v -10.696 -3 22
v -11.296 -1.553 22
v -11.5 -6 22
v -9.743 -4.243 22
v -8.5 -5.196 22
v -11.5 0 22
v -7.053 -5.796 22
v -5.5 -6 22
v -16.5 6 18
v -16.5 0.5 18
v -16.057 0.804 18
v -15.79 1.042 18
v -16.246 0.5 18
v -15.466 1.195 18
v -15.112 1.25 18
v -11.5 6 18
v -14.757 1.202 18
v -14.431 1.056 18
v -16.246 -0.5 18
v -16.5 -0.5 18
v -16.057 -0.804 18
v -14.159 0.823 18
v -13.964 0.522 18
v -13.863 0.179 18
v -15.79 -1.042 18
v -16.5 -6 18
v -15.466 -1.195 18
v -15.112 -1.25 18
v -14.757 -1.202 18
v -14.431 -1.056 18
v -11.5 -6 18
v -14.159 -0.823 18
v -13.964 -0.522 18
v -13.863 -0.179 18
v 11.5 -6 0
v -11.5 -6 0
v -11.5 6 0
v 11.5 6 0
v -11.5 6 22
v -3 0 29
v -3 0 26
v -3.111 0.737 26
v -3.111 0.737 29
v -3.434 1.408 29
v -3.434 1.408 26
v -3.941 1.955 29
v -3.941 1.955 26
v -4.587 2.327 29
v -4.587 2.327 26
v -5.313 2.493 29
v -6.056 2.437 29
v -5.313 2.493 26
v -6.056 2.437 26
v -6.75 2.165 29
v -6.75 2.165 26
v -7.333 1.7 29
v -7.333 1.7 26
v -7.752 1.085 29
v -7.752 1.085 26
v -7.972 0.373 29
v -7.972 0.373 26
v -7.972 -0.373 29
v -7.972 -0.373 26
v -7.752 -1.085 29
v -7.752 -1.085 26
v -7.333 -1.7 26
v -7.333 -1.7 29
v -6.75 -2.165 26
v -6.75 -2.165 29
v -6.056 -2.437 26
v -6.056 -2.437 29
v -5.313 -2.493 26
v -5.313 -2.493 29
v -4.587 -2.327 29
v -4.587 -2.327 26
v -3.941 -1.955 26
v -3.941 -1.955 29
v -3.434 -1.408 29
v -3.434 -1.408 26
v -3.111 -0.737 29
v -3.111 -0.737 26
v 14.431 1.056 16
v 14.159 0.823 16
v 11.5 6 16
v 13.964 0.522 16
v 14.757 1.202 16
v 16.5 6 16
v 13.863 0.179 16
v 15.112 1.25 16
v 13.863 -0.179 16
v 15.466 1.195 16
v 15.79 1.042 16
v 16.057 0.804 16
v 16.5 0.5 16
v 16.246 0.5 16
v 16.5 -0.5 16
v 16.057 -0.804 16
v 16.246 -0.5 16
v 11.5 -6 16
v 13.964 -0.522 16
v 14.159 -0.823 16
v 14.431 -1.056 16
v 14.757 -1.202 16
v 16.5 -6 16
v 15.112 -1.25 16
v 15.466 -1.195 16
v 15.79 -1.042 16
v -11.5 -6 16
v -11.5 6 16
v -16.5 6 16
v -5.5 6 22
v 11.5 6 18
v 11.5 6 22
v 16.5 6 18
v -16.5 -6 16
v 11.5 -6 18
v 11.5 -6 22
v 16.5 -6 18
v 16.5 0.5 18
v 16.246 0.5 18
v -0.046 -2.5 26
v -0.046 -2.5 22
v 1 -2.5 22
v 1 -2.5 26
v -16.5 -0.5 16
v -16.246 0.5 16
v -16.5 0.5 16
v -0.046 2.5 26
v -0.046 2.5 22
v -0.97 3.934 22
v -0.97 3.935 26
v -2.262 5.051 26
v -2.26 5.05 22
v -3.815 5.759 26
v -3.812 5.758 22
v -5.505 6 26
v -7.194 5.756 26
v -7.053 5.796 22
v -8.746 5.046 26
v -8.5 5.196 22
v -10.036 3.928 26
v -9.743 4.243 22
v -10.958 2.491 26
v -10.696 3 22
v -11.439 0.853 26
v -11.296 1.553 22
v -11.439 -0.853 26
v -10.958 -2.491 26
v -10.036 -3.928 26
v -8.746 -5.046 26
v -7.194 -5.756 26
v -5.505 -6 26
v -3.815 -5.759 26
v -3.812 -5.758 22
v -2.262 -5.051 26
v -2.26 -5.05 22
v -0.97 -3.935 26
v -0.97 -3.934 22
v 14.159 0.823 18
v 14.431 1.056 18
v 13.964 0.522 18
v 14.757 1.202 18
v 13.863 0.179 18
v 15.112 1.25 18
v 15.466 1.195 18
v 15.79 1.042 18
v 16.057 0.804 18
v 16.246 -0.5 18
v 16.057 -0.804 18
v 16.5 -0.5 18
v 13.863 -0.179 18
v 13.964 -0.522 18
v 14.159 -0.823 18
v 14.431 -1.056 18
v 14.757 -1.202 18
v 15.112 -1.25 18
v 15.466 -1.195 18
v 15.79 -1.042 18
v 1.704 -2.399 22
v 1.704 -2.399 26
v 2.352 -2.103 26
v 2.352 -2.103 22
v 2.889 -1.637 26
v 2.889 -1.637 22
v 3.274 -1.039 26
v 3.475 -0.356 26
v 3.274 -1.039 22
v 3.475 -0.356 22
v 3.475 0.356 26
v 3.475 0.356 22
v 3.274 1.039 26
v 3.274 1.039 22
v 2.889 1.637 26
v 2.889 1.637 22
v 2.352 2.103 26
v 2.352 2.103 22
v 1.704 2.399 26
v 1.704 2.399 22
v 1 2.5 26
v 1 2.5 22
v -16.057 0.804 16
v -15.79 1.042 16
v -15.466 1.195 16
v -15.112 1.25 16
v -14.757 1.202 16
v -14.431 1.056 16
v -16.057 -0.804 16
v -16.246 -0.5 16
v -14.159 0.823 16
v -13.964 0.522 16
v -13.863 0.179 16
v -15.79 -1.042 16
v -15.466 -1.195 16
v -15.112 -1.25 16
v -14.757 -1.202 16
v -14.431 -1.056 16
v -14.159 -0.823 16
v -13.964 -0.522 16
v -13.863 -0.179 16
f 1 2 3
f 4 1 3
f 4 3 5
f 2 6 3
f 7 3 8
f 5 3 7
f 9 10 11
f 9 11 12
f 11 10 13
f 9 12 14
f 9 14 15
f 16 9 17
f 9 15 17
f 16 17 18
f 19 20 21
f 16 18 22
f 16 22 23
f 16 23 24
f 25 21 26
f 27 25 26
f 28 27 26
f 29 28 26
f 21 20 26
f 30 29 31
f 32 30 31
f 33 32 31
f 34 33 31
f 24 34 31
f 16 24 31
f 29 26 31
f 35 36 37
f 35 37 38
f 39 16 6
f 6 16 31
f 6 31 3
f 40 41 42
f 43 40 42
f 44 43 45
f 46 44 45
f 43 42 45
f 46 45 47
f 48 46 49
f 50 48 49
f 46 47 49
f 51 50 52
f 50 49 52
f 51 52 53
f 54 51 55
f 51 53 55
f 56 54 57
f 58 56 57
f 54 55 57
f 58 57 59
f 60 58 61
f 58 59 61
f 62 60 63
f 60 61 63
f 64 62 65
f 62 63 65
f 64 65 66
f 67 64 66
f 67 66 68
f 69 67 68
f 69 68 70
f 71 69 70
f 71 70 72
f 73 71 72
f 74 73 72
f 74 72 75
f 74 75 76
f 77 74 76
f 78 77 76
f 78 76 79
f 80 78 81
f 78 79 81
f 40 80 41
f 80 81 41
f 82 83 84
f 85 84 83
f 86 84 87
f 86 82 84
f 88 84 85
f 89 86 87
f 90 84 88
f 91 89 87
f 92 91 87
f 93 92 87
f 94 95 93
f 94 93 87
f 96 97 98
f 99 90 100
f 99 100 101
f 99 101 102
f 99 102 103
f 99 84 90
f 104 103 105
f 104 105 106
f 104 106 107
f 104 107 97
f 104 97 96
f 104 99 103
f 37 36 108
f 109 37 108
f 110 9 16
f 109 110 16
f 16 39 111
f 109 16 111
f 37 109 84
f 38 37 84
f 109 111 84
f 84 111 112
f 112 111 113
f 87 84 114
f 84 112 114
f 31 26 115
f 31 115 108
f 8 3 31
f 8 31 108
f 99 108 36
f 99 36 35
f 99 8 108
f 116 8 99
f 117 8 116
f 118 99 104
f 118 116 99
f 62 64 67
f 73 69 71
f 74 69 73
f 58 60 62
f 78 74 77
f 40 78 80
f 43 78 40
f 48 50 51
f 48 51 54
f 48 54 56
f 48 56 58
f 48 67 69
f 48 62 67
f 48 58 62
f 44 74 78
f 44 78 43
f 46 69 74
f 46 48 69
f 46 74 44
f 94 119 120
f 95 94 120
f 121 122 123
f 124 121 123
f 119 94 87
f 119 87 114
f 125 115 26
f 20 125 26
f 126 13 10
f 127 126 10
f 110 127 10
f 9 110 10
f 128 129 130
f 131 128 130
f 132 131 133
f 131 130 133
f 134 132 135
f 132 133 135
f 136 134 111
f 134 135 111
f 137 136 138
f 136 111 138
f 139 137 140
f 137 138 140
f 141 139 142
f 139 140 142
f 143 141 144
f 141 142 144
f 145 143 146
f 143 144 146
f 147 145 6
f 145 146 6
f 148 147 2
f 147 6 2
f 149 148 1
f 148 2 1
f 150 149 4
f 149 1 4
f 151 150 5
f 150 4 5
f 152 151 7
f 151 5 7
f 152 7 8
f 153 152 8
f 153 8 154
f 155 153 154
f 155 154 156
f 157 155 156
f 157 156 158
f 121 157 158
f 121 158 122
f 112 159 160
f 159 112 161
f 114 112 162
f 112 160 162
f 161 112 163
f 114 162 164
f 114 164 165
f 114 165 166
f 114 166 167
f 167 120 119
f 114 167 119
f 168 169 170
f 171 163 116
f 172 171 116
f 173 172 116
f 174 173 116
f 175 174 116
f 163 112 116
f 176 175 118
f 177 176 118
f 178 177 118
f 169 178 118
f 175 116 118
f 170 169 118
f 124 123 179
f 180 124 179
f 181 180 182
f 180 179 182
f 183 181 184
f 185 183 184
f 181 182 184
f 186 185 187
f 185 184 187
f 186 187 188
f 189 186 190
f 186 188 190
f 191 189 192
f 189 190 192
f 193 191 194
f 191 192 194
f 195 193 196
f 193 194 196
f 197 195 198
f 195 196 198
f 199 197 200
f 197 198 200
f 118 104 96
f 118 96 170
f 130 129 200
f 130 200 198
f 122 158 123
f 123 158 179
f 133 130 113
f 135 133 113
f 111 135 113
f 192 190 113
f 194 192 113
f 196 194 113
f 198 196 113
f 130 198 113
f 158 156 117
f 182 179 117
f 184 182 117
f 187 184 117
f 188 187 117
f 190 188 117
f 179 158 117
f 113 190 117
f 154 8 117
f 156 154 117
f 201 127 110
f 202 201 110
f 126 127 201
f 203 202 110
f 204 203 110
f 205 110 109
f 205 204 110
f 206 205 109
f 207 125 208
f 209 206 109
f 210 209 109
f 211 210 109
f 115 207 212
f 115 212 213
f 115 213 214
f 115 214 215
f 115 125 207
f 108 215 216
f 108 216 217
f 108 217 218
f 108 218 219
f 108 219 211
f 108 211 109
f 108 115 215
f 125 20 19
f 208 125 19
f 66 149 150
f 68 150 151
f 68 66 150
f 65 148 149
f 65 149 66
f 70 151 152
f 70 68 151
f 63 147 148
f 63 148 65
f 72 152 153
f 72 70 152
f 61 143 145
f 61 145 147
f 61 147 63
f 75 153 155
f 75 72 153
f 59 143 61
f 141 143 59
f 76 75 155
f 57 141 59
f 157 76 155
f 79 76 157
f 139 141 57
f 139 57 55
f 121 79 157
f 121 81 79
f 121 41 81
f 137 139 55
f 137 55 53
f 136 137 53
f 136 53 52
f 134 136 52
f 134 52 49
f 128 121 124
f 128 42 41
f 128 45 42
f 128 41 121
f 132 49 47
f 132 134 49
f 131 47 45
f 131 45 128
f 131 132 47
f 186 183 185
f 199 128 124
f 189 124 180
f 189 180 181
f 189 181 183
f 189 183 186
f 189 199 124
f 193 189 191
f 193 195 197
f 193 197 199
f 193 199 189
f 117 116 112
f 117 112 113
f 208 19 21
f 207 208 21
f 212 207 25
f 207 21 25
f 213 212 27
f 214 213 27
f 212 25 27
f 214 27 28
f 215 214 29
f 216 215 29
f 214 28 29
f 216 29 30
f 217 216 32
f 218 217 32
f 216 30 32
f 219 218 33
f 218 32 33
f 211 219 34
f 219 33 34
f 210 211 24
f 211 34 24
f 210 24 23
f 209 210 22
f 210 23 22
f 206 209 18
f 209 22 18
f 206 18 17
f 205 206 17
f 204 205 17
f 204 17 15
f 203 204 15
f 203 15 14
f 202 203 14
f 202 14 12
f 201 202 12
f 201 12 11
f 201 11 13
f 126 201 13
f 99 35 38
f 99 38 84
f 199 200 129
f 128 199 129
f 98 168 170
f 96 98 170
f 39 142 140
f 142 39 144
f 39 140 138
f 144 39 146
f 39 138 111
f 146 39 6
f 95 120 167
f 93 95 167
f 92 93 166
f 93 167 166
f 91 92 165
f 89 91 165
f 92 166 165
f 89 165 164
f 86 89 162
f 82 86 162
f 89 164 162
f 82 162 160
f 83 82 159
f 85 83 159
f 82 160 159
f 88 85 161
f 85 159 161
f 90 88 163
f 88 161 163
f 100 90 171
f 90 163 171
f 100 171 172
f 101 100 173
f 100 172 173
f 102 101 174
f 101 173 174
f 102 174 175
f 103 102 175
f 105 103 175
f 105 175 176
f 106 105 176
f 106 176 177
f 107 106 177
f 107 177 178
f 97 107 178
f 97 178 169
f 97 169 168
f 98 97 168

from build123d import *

# Parameters (mm, degrees)
F0_W      = 23
F0_H      = 22
F1_DEPTH  = 6
F2_W      = 33
F2_H      = 2
F3_DEPTH  = 12
F4_R      = 6
F5_DEPTH  = 4
F7_DEPTH  = 4
F8_R      = 2.5
F9_DEPTH  = 3
F11_DEPTH = 18.001
F13_DEPTH = 18.001


with BuildPart() as f1:
    # F0 (on Front) → F1 (new body, symmetric)
    with BuildSketch(Plane.XZ):
        with Locations((0, 11)):
            Rectangle(F0_W, F0_H)
    extrude(amount=F1_DEPTH, both=True)

    # F2 (on face) → F3 (join)
    with BuildSketch(Plane.XZ.offset(6)):
        with Locations((0, 17)):
            Rectangle(F2_W, F2_H)
    extrude(amount=-F3_DEPTH)

    # F4 (on face) → F5 (join)
    with BuildSketch(Plane.XY.offset(22)):
        with Locations((-5.5, 0)):
            Circle(F4_R)
    extrude(amount=F5_DEPTH)

    # F6 (on face) → F7 (join)
    with BuildSketch(Plane.XY.offset(22)):
        with BuildLine():
            Line((-2, -2.5), (1, -2.5))
            ThreePointArc((1, -2.5), (3.5, 0), (1, 2.5))
            Line((1, 2.5), (-2, 2.5))
            Line((-2, 2.5), (-2, -2.5))
        make_face()
    extrude(amount=F7_DEPTH)

    # F8 (on face) → F9 (join)
    with BuildSketch(Plane.XY.offset(26)):
        with Locations((-5.5, 0)):
            Circle(F8_R)
    extrude(amount=F9_DEPTH)

    # F10 (on face) → F11 (cut, through all)
    with BuildSketch(Plane.XY.offset(18)):
        with BuildLine():
            Line((16.745644, 0.5), (16.245644, 0.5))
            ThreePointArc((16.245644, 0.5), (13.85, 0), (16.245644, -0.5))
            Line((16.245644, -0.5), (16.745644, -0.5))
            Line((16.745644, -0.5), (16.745644, 0.5))
        make_face()
    extrude(amount=-F11_DEPTH, mode=Mode.SUBTRACT)

    # F12 (on face) → F13 (cut, through all)
    with BuildSketch(Plane.XY.offset(18)):
        with BuildLine():
            Line((-16.934745, -0.5), (-16.245644, -0.5))
            ThreePointArc((-16.245644, -0.5), (-13.85, 0), (-16.245644, 0.5))
            Line((-16.245644, 0.5), (-16.934745, 0.5))
            Line((-16.934745, 0.5), (-16.934745, -0.5))
        make_face()
    extrude(amount=-F13_DEPTH, mode=Mode.SUBTRACT)


solid = f1.part
